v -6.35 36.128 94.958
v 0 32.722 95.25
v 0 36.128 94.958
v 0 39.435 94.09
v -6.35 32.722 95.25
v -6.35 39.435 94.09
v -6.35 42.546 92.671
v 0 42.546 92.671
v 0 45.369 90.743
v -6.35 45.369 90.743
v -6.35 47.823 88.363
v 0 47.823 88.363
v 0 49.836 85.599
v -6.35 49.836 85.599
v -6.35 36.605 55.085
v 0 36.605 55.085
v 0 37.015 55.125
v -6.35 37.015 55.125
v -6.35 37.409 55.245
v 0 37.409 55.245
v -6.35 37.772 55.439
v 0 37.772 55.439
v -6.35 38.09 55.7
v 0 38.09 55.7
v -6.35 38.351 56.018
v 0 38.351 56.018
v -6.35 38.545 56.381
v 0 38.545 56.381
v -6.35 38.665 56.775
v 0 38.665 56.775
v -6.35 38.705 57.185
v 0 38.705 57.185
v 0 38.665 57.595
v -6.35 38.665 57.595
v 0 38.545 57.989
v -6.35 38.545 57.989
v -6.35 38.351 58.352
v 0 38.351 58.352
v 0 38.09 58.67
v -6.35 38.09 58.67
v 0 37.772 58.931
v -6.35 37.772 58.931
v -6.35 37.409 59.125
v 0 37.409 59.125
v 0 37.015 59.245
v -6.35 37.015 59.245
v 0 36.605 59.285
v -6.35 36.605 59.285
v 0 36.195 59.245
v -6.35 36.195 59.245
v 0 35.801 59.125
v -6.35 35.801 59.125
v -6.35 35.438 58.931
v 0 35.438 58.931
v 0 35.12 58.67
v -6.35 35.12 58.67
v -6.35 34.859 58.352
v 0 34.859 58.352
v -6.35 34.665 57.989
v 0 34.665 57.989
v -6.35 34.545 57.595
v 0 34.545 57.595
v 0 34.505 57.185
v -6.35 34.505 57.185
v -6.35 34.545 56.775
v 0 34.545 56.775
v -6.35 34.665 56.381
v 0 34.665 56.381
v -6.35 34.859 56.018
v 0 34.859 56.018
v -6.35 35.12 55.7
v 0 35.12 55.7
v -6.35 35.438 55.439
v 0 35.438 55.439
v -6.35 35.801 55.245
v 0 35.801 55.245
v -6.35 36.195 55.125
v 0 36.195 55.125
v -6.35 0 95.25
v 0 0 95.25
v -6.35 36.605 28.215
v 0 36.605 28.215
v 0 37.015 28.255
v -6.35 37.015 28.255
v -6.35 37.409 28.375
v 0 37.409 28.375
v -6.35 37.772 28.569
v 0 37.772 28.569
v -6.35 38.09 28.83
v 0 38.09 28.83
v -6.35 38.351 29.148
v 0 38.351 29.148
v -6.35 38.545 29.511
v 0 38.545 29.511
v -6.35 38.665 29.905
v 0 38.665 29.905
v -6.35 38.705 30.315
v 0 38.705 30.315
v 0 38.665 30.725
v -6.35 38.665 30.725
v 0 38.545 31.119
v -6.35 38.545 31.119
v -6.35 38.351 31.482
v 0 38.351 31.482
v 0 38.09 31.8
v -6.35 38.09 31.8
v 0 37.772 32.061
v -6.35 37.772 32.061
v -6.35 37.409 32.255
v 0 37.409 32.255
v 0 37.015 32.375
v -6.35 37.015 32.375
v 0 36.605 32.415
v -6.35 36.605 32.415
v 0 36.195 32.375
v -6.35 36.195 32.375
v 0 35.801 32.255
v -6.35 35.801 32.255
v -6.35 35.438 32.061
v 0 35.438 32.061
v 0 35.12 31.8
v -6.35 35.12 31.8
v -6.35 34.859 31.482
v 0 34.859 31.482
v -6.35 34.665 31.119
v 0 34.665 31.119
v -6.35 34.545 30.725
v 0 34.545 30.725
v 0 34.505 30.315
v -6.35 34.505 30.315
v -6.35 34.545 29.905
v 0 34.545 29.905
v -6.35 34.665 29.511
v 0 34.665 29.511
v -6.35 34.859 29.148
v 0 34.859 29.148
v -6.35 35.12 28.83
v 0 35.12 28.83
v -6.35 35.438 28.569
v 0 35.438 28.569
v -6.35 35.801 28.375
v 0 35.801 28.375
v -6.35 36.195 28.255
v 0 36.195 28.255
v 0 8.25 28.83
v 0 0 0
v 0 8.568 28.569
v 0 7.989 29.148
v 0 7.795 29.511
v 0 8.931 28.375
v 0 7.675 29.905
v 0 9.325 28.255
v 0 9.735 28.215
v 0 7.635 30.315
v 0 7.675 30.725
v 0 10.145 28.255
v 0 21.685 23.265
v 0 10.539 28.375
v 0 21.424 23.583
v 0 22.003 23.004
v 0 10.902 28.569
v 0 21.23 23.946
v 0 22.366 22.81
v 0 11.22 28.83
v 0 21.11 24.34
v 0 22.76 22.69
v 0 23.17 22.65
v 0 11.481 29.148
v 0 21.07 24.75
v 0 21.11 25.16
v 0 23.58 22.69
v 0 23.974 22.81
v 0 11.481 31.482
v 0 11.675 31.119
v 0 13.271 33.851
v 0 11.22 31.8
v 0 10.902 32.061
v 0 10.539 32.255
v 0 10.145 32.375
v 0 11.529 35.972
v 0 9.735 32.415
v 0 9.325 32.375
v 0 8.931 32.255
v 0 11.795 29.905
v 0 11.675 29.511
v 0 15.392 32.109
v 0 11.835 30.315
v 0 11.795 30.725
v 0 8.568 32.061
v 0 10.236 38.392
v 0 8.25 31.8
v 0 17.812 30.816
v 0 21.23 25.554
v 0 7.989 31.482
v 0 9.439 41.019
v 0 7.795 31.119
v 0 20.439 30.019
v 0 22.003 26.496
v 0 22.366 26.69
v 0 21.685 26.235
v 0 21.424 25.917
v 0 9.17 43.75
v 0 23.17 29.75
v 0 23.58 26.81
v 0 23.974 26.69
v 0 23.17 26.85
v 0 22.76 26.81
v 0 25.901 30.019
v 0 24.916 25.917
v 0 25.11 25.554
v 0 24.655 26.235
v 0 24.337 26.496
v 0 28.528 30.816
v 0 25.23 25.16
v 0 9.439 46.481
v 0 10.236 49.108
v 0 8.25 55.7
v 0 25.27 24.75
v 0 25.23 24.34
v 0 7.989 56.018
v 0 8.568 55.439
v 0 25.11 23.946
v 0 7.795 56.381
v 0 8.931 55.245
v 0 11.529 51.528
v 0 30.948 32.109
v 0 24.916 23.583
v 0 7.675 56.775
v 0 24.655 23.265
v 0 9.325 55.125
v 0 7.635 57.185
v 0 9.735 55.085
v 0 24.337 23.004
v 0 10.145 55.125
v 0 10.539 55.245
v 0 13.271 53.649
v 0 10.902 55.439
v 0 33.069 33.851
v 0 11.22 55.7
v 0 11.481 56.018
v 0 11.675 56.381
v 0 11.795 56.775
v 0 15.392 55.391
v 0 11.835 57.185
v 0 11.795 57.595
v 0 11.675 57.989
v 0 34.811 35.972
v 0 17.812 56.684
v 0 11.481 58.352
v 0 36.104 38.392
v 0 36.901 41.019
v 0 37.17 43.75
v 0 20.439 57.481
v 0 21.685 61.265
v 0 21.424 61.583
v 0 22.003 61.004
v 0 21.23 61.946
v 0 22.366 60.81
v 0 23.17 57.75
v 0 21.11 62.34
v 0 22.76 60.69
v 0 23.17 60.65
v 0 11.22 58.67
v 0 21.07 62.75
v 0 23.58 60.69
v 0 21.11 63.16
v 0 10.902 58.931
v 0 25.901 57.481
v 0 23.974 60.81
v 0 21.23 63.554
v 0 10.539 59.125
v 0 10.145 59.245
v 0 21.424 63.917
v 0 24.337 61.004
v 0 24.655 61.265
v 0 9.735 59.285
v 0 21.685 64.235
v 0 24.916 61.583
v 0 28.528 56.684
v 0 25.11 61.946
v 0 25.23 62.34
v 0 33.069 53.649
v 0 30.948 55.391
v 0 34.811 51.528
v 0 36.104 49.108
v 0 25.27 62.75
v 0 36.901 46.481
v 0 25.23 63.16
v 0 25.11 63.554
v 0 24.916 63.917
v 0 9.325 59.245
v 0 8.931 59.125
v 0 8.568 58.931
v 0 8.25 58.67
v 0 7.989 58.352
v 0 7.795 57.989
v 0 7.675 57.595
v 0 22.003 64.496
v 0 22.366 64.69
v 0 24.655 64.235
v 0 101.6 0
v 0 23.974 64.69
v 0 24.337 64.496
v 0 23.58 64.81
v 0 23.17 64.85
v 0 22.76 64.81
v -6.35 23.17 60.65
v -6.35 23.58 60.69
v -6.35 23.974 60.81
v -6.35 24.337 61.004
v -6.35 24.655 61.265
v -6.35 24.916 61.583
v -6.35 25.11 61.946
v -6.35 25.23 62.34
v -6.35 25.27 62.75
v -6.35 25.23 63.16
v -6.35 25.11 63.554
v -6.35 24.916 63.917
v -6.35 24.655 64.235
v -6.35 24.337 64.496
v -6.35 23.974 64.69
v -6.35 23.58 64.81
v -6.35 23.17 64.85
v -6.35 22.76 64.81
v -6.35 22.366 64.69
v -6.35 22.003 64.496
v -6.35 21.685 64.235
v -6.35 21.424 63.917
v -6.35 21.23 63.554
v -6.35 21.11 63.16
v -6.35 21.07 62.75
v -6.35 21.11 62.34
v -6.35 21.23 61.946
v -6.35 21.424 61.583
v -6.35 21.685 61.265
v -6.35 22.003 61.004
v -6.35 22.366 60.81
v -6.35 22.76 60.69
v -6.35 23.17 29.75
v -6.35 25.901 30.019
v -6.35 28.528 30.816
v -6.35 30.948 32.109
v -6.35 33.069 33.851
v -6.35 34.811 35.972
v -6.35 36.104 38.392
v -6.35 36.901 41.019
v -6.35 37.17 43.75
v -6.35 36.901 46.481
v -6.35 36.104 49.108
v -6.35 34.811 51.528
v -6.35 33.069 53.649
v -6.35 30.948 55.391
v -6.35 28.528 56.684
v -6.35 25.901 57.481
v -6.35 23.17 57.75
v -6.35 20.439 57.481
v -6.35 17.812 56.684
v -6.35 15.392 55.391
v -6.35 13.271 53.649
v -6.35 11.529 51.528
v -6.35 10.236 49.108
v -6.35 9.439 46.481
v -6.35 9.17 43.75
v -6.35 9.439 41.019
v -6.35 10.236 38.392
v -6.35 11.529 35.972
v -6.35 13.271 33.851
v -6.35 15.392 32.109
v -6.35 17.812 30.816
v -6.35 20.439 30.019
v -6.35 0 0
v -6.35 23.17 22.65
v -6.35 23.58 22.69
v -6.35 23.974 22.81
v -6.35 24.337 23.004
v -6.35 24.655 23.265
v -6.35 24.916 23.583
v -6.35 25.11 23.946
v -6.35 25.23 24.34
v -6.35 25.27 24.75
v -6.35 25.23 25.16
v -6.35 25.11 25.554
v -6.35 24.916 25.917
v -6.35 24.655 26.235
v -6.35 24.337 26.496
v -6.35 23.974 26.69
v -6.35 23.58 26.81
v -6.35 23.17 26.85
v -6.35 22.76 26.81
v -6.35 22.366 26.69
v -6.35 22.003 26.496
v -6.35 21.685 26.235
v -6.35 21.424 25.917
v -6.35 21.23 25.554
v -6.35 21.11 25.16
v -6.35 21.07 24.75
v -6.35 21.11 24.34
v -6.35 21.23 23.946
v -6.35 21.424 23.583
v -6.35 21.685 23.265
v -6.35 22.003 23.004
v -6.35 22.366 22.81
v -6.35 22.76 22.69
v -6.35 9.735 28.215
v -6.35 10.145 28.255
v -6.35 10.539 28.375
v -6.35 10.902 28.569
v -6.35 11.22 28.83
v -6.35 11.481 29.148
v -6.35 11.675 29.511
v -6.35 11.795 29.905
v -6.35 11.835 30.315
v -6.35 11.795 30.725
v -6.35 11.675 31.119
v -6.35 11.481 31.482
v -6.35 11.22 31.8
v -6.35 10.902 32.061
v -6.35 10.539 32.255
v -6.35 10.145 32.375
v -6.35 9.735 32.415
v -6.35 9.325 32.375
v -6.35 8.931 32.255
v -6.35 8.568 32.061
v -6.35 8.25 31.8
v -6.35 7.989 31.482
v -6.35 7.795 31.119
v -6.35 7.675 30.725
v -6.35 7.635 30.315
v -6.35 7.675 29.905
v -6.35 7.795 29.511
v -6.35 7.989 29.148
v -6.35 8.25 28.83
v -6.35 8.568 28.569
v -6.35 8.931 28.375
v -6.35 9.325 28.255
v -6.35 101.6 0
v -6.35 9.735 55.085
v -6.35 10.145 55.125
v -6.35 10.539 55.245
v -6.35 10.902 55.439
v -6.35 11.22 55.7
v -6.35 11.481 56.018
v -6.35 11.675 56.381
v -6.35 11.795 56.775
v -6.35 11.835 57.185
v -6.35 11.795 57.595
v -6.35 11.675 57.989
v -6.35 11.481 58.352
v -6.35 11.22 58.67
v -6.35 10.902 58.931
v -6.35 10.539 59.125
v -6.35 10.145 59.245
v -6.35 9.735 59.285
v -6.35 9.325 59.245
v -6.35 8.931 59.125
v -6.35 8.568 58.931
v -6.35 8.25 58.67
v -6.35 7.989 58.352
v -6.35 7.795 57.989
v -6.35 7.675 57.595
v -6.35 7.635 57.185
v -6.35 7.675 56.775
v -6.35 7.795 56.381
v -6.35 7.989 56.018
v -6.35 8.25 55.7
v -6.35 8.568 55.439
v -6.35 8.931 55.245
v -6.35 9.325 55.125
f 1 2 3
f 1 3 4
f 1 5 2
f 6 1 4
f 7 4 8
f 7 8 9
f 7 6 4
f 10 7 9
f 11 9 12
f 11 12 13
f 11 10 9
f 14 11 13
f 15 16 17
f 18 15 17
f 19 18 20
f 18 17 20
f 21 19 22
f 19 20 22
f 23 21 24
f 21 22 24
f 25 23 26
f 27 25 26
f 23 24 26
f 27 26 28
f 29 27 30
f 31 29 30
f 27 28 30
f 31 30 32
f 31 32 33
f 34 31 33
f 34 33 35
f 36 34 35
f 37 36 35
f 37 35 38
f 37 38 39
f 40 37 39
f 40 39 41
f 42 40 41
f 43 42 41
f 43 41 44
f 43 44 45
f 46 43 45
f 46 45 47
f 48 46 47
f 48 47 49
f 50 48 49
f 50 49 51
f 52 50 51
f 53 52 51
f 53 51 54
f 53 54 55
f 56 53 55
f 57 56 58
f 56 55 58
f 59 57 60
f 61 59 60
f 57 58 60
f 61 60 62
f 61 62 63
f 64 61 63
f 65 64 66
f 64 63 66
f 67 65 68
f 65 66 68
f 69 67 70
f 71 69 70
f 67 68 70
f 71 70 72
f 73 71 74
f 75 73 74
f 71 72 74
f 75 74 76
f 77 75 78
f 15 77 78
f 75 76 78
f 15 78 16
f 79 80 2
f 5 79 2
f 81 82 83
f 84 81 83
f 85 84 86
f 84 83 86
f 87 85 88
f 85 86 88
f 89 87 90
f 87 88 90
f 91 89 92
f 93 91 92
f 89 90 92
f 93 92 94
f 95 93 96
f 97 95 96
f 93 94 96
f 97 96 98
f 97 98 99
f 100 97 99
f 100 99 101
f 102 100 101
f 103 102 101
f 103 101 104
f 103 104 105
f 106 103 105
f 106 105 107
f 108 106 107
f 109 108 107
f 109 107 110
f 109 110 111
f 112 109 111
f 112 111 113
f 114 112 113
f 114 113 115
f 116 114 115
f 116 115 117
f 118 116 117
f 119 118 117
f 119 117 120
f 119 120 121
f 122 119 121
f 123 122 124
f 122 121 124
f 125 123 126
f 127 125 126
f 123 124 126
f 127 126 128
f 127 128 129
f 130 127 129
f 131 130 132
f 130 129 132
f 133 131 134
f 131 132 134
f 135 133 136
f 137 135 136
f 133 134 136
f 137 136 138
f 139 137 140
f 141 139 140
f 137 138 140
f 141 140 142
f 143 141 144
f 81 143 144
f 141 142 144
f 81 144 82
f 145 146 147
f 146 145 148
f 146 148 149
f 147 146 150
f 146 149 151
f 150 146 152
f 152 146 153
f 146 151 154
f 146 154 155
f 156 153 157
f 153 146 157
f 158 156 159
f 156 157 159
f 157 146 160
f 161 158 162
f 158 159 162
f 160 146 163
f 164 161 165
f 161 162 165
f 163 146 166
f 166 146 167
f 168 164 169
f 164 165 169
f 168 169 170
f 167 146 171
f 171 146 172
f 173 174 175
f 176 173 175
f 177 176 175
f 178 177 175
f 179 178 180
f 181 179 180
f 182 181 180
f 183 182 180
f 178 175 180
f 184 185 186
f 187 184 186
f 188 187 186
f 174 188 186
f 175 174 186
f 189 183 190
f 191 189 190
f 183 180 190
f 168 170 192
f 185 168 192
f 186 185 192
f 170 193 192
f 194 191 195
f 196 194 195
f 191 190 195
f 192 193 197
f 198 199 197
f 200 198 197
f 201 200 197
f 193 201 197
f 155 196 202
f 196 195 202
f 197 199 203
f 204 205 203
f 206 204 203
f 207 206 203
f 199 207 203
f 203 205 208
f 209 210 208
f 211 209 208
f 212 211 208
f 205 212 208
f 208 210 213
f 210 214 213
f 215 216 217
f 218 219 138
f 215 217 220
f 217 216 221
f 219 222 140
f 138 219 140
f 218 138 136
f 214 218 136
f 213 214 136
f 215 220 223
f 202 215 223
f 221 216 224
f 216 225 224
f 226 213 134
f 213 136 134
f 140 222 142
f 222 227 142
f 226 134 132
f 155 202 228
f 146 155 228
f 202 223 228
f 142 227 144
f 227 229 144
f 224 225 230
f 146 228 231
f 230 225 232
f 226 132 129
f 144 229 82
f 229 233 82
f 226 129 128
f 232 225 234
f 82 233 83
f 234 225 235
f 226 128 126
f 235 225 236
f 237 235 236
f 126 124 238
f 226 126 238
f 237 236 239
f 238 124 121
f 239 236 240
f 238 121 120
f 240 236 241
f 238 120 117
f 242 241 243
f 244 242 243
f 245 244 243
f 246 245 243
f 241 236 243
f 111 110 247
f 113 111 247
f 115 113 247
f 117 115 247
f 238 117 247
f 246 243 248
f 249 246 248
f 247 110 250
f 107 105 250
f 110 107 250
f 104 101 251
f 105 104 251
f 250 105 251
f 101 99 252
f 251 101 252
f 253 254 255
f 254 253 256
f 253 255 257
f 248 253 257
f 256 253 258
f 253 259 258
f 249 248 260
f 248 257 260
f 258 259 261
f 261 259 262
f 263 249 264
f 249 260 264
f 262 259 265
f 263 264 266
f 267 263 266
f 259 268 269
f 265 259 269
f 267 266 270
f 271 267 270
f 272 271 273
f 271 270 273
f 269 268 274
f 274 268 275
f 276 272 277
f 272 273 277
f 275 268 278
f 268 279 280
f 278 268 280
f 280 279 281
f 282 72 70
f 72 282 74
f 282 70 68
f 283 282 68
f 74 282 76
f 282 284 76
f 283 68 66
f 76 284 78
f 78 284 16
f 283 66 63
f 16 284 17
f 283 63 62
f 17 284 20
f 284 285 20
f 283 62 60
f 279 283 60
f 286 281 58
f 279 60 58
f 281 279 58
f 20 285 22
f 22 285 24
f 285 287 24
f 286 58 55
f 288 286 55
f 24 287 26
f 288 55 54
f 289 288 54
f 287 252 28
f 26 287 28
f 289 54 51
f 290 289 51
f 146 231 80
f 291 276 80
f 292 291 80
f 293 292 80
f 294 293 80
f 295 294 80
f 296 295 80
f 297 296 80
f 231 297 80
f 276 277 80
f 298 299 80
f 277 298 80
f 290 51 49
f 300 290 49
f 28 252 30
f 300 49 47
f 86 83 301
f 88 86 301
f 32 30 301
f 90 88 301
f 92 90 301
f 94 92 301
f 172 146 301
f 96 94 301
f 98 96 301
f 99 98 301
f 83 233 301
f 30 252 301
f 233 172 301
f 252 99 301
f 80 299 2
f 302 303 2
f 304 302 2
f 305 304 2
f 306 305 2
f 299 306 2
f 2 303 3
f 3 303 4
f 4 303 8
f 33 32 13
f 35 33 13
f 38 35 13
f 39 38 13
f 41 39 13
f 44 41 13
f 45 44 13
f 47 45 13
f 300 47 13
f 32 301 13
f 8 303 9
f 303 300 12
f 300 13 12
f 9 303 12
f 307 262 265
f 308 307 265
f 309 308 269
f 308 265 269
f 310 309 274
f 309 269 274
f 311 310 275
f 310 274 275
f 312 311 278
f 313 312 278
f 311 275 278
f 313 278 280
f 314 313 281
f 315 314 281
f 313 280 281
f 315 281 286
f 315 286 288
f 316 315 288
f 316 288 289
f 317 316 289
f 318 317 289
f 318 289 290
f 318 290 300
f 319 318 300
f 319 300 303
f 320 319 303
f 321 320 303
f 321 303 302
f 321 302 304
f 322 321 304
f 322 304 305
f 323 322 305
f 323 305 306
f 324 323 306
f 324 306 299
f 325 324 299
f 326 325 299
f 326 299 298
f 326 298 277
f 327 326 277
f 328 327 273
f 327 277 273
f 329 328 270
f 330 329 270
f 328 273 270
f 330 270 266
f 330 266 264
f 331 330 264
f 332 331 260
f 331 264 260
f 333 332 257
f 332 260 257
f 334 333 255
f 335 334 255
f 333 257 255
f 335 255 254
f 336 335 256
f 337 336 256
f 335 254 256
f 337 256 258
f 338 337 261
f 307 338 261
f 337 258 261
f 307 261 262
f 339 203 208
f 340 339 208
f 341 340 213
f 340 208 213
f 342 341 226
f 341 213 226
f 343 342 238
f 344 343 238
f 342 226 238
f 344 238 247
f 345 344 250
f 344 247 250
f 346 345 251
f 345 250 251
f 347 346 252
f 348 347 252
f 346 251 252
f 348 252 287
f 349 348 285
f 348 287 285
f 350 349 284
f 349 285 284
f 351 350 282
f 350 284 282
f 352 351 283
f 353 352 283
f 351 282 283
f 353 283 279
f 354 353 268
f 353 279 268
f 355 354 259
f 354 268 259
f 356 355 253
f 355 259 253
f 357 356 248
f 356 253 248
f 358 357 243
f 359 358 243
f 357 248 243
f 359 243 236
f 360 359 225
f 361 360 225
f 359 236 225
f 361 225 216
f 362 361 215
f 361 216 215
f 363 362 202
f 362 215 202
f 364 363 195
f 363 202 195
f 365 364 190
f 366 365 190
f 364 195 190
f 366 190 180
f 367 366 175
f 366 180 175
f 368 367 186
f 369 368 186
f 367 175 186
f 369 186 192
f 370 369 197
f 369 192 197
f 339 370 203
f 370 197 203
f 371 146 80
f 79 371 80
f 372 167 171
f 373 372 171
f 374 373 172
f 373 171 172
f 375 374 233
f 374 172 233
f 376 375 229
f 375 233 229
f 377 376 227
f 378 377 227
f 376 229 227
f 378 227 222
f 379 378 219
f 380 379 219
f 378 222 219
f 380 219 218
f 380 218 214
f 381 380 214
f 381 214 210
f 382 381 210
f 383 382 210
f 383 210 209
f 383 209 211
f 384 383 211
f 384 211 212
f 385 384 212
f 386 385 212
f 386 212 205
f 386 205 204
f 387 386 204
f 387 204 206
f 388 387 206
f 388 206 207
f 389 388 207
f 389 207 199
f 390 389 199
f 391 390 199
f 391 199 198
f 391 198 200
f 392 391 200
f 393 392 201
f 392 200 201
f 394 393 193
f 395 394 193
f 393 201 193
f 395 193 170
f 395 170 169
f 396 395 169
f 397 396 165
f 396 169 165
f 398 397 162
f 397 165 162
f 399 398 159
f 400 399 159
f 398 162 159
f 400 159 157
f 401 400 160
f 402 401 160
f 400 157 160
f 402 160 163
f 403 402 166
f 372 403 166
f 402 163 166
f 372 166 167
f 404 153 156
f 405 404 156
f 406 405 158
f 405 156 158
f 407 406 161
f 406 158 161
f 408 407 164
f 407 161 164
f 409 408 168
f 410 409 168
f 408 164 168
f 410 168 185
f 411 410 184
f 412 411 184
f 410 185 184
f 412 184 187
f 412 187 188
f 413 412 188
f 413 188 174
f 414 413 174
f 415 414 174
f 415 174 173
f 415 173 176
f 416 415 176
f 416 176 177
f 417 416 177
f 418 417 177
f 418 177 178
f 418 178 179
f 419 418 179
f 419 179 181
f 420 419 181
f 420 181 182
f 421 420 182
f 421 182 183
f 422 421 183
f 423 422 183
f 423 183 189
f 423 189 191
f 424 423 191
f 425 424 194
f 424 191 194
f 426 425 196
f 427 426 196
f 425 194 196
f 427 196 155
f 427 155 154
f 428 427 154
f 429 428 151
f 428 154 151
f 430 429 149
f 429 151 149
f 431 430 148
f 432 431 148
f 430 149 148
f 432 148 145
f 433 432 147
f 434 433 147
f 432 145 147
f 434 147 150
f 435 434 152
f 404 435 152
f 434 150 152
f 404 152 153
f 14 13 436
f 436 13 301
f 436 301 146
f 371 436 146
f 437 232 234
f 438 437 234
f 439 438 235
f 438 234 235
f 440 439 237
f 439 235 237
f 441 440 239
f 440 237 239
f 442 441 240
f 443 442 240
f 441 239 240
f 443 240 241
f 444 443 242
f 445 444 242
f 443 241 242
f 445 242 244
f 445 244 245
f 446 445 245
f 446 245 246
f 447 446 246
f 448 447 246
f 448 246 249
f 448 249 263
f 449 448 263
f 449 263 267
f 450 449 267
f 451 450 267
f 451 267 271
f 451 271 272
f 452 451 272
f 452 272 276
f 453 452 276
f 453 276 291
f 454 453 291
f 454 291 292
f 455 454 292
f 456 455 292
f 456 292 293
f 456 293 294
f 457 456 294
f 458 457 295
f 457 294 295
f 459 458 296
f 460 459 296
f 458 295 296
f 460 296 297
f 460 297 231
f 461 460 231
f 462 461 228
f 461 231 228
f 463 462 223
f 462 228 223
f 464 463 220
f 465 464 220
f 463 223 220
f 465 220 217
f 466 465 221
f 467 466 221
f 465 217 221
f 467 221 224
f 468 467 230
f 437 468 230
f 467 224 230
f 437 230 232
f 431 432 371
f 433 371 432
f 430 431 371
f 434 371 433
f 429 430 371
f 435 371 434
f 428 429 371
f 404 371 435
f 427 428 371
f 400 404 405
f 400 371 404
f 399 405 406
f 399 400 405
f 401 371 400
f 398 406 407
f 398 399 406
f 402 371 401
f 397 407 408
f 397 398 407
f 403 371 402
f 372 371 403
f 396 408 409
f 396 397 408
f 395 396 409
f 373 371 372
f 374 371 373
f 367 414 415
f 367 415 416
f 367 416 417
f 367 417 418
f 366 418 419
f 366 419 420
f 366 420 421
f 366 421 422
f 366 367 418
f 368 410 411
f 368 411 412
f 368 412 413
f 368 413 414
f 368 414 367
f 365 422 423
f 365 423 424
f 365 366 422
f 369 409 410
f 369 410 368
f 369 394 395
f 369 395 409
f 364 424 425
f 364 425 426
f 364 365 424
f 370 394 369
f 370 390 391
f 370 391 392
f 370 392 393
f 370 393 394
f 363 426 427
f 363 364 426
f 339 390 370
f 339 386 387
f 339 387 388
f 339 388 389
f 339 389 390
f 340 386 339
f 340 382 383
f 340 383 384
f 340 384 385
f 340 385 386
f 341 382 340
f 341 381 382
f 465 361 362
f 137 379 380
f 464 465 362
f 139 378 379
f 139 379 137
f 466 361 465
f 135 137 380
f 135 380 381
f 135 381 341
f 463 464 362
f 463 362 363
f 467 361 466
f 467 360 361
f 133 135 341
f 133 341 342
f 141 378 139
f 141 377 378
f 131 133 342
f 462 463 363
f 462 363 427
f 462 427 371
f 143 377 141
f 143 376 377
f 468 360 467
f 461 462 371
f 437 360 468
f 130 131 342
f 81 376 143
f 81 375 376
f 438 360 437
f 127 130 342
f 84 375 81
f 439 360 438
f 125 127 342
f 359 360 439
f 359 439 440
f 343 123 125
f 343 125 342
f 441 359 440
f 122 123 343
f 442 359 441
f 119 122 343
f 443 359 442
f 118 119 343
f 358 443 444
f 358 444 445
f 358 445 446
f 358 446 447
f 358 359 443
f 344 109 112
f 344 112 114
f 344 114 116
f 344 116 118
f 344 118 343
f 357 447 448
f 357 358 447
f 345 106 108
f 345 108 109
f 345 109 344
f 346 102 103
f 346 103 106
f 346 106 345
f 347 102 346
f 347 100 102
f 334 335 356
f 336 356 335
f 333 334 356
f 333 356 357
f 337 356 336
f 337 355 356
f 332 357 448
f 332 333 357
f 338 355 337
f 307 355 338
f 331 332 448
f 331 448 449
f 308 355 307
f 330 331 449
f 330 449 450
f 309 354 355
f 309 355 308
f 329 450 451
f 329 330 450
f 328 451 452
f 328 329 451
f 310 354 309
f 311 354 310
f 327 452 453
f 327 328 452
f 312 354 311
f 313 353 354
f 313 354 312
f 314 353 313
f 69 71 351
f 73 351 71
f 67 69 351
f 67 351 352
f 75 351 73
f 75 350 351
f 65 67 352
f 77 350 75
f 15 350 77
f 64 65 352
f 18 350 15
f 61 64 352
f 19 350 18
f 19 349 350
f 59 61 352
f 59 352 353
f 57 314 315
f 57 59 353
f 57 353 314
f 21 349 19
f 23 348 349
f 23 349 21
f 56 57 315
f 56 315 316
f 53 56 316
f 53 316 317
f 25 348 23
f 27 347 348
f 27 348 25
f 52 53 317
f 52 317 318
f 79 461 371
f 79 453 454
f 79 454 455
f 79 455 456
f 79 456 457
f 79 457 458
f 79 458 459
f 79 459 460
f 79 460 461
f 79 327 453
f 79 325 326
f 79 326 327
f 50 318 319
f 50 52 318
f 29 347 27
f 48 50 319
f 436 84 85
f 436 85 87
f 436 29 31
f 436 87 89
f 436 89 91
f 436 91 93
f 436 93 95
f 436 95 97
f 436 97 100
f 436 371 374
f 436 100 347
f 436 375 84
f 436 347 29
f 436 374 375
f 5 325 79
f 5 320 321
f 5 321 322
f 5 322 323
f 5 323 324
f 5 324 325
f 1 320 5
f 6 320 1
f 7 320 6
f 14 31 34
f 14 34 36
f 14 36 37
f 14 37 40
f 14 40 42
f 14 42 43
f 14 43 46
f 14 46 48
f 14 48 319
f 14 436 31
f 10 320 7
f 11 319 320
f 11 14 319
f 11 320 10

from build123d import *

# Parameters (mm, degrees)
BOSS_EXTRUDE1_DEPTH = 6.35
FILLET1_R           = 20
SKETCH2_R           = 14
CUT_EXTRUDE1_DEPTH  = 6.35
SKETCH3_R           = 2.1
CUT_EXTRUDE2_DEPTH  = 10


with BuildPart() as part:
    # Sketch1 → Boss-Extrude1 (new body)
    with BuildSketch(Plane(origin=(0, 0, 0), x_dir=(0, 0, -1), z_dir=(1, 0, 0))):
        Polygon((0, 0), (-95.25, 0), (-95.25, 44), (0, 101.6), align=None)
    extrude(amount=-BOSS_EXTRUDE1_DEPTH)

    # Fillet1
    fillet1_edges = [part.edges().sort_by_distance(p)[0] for p in [
        (-3.175, 44, 95.25),
    ]]
    fillet(fillet1_edges, radius=FILLET1_R)

    # Sketch2 → Cut-Extrude1 (cut)
    with BuildSketch(Plane(origin=(0, 0, 0), x_dir=(0, 0, -1), z_dir=(1, 0, 0))):
        with Locations((-43.75, 23.17)):
            Circle(SKETCH2_R)
    extrude(amount=-CUT_EXTRUDE1_DEPTH, mode=Mode.SUBTRACT)

    # Sketch3 → Cut-Extrude2 (cut)
    with BuildSketch(Plane(origin=(0, 0, 0), x_dir=(0, 0, -1), z_dir=(1, 0, 0))):
        with Locations((-57.185028843, 36.605028843)):
            Circle(SKETCH3_R)
        with Locations((-62.75, 23.17)):
            Circle(SKETCH3_R)
        with Locations((-57.185028843, 9.734971157)):
            Circle(SKETCH3_R)
        with Locations((-30.314971157, 9.734971157)):
            Circle(SKETCH3_R)
        with Locations((-24.75, 23.17)):
            Circle(SKETCH3_R)
        with Locations((-30.314971157, 36.605028843)):
            Circle(SKETCH3_R)
    extrude(amount=-CUT_EXTRUDE2_DEPTH, mode=Mode.SUBTRACT)


solid = part.part
